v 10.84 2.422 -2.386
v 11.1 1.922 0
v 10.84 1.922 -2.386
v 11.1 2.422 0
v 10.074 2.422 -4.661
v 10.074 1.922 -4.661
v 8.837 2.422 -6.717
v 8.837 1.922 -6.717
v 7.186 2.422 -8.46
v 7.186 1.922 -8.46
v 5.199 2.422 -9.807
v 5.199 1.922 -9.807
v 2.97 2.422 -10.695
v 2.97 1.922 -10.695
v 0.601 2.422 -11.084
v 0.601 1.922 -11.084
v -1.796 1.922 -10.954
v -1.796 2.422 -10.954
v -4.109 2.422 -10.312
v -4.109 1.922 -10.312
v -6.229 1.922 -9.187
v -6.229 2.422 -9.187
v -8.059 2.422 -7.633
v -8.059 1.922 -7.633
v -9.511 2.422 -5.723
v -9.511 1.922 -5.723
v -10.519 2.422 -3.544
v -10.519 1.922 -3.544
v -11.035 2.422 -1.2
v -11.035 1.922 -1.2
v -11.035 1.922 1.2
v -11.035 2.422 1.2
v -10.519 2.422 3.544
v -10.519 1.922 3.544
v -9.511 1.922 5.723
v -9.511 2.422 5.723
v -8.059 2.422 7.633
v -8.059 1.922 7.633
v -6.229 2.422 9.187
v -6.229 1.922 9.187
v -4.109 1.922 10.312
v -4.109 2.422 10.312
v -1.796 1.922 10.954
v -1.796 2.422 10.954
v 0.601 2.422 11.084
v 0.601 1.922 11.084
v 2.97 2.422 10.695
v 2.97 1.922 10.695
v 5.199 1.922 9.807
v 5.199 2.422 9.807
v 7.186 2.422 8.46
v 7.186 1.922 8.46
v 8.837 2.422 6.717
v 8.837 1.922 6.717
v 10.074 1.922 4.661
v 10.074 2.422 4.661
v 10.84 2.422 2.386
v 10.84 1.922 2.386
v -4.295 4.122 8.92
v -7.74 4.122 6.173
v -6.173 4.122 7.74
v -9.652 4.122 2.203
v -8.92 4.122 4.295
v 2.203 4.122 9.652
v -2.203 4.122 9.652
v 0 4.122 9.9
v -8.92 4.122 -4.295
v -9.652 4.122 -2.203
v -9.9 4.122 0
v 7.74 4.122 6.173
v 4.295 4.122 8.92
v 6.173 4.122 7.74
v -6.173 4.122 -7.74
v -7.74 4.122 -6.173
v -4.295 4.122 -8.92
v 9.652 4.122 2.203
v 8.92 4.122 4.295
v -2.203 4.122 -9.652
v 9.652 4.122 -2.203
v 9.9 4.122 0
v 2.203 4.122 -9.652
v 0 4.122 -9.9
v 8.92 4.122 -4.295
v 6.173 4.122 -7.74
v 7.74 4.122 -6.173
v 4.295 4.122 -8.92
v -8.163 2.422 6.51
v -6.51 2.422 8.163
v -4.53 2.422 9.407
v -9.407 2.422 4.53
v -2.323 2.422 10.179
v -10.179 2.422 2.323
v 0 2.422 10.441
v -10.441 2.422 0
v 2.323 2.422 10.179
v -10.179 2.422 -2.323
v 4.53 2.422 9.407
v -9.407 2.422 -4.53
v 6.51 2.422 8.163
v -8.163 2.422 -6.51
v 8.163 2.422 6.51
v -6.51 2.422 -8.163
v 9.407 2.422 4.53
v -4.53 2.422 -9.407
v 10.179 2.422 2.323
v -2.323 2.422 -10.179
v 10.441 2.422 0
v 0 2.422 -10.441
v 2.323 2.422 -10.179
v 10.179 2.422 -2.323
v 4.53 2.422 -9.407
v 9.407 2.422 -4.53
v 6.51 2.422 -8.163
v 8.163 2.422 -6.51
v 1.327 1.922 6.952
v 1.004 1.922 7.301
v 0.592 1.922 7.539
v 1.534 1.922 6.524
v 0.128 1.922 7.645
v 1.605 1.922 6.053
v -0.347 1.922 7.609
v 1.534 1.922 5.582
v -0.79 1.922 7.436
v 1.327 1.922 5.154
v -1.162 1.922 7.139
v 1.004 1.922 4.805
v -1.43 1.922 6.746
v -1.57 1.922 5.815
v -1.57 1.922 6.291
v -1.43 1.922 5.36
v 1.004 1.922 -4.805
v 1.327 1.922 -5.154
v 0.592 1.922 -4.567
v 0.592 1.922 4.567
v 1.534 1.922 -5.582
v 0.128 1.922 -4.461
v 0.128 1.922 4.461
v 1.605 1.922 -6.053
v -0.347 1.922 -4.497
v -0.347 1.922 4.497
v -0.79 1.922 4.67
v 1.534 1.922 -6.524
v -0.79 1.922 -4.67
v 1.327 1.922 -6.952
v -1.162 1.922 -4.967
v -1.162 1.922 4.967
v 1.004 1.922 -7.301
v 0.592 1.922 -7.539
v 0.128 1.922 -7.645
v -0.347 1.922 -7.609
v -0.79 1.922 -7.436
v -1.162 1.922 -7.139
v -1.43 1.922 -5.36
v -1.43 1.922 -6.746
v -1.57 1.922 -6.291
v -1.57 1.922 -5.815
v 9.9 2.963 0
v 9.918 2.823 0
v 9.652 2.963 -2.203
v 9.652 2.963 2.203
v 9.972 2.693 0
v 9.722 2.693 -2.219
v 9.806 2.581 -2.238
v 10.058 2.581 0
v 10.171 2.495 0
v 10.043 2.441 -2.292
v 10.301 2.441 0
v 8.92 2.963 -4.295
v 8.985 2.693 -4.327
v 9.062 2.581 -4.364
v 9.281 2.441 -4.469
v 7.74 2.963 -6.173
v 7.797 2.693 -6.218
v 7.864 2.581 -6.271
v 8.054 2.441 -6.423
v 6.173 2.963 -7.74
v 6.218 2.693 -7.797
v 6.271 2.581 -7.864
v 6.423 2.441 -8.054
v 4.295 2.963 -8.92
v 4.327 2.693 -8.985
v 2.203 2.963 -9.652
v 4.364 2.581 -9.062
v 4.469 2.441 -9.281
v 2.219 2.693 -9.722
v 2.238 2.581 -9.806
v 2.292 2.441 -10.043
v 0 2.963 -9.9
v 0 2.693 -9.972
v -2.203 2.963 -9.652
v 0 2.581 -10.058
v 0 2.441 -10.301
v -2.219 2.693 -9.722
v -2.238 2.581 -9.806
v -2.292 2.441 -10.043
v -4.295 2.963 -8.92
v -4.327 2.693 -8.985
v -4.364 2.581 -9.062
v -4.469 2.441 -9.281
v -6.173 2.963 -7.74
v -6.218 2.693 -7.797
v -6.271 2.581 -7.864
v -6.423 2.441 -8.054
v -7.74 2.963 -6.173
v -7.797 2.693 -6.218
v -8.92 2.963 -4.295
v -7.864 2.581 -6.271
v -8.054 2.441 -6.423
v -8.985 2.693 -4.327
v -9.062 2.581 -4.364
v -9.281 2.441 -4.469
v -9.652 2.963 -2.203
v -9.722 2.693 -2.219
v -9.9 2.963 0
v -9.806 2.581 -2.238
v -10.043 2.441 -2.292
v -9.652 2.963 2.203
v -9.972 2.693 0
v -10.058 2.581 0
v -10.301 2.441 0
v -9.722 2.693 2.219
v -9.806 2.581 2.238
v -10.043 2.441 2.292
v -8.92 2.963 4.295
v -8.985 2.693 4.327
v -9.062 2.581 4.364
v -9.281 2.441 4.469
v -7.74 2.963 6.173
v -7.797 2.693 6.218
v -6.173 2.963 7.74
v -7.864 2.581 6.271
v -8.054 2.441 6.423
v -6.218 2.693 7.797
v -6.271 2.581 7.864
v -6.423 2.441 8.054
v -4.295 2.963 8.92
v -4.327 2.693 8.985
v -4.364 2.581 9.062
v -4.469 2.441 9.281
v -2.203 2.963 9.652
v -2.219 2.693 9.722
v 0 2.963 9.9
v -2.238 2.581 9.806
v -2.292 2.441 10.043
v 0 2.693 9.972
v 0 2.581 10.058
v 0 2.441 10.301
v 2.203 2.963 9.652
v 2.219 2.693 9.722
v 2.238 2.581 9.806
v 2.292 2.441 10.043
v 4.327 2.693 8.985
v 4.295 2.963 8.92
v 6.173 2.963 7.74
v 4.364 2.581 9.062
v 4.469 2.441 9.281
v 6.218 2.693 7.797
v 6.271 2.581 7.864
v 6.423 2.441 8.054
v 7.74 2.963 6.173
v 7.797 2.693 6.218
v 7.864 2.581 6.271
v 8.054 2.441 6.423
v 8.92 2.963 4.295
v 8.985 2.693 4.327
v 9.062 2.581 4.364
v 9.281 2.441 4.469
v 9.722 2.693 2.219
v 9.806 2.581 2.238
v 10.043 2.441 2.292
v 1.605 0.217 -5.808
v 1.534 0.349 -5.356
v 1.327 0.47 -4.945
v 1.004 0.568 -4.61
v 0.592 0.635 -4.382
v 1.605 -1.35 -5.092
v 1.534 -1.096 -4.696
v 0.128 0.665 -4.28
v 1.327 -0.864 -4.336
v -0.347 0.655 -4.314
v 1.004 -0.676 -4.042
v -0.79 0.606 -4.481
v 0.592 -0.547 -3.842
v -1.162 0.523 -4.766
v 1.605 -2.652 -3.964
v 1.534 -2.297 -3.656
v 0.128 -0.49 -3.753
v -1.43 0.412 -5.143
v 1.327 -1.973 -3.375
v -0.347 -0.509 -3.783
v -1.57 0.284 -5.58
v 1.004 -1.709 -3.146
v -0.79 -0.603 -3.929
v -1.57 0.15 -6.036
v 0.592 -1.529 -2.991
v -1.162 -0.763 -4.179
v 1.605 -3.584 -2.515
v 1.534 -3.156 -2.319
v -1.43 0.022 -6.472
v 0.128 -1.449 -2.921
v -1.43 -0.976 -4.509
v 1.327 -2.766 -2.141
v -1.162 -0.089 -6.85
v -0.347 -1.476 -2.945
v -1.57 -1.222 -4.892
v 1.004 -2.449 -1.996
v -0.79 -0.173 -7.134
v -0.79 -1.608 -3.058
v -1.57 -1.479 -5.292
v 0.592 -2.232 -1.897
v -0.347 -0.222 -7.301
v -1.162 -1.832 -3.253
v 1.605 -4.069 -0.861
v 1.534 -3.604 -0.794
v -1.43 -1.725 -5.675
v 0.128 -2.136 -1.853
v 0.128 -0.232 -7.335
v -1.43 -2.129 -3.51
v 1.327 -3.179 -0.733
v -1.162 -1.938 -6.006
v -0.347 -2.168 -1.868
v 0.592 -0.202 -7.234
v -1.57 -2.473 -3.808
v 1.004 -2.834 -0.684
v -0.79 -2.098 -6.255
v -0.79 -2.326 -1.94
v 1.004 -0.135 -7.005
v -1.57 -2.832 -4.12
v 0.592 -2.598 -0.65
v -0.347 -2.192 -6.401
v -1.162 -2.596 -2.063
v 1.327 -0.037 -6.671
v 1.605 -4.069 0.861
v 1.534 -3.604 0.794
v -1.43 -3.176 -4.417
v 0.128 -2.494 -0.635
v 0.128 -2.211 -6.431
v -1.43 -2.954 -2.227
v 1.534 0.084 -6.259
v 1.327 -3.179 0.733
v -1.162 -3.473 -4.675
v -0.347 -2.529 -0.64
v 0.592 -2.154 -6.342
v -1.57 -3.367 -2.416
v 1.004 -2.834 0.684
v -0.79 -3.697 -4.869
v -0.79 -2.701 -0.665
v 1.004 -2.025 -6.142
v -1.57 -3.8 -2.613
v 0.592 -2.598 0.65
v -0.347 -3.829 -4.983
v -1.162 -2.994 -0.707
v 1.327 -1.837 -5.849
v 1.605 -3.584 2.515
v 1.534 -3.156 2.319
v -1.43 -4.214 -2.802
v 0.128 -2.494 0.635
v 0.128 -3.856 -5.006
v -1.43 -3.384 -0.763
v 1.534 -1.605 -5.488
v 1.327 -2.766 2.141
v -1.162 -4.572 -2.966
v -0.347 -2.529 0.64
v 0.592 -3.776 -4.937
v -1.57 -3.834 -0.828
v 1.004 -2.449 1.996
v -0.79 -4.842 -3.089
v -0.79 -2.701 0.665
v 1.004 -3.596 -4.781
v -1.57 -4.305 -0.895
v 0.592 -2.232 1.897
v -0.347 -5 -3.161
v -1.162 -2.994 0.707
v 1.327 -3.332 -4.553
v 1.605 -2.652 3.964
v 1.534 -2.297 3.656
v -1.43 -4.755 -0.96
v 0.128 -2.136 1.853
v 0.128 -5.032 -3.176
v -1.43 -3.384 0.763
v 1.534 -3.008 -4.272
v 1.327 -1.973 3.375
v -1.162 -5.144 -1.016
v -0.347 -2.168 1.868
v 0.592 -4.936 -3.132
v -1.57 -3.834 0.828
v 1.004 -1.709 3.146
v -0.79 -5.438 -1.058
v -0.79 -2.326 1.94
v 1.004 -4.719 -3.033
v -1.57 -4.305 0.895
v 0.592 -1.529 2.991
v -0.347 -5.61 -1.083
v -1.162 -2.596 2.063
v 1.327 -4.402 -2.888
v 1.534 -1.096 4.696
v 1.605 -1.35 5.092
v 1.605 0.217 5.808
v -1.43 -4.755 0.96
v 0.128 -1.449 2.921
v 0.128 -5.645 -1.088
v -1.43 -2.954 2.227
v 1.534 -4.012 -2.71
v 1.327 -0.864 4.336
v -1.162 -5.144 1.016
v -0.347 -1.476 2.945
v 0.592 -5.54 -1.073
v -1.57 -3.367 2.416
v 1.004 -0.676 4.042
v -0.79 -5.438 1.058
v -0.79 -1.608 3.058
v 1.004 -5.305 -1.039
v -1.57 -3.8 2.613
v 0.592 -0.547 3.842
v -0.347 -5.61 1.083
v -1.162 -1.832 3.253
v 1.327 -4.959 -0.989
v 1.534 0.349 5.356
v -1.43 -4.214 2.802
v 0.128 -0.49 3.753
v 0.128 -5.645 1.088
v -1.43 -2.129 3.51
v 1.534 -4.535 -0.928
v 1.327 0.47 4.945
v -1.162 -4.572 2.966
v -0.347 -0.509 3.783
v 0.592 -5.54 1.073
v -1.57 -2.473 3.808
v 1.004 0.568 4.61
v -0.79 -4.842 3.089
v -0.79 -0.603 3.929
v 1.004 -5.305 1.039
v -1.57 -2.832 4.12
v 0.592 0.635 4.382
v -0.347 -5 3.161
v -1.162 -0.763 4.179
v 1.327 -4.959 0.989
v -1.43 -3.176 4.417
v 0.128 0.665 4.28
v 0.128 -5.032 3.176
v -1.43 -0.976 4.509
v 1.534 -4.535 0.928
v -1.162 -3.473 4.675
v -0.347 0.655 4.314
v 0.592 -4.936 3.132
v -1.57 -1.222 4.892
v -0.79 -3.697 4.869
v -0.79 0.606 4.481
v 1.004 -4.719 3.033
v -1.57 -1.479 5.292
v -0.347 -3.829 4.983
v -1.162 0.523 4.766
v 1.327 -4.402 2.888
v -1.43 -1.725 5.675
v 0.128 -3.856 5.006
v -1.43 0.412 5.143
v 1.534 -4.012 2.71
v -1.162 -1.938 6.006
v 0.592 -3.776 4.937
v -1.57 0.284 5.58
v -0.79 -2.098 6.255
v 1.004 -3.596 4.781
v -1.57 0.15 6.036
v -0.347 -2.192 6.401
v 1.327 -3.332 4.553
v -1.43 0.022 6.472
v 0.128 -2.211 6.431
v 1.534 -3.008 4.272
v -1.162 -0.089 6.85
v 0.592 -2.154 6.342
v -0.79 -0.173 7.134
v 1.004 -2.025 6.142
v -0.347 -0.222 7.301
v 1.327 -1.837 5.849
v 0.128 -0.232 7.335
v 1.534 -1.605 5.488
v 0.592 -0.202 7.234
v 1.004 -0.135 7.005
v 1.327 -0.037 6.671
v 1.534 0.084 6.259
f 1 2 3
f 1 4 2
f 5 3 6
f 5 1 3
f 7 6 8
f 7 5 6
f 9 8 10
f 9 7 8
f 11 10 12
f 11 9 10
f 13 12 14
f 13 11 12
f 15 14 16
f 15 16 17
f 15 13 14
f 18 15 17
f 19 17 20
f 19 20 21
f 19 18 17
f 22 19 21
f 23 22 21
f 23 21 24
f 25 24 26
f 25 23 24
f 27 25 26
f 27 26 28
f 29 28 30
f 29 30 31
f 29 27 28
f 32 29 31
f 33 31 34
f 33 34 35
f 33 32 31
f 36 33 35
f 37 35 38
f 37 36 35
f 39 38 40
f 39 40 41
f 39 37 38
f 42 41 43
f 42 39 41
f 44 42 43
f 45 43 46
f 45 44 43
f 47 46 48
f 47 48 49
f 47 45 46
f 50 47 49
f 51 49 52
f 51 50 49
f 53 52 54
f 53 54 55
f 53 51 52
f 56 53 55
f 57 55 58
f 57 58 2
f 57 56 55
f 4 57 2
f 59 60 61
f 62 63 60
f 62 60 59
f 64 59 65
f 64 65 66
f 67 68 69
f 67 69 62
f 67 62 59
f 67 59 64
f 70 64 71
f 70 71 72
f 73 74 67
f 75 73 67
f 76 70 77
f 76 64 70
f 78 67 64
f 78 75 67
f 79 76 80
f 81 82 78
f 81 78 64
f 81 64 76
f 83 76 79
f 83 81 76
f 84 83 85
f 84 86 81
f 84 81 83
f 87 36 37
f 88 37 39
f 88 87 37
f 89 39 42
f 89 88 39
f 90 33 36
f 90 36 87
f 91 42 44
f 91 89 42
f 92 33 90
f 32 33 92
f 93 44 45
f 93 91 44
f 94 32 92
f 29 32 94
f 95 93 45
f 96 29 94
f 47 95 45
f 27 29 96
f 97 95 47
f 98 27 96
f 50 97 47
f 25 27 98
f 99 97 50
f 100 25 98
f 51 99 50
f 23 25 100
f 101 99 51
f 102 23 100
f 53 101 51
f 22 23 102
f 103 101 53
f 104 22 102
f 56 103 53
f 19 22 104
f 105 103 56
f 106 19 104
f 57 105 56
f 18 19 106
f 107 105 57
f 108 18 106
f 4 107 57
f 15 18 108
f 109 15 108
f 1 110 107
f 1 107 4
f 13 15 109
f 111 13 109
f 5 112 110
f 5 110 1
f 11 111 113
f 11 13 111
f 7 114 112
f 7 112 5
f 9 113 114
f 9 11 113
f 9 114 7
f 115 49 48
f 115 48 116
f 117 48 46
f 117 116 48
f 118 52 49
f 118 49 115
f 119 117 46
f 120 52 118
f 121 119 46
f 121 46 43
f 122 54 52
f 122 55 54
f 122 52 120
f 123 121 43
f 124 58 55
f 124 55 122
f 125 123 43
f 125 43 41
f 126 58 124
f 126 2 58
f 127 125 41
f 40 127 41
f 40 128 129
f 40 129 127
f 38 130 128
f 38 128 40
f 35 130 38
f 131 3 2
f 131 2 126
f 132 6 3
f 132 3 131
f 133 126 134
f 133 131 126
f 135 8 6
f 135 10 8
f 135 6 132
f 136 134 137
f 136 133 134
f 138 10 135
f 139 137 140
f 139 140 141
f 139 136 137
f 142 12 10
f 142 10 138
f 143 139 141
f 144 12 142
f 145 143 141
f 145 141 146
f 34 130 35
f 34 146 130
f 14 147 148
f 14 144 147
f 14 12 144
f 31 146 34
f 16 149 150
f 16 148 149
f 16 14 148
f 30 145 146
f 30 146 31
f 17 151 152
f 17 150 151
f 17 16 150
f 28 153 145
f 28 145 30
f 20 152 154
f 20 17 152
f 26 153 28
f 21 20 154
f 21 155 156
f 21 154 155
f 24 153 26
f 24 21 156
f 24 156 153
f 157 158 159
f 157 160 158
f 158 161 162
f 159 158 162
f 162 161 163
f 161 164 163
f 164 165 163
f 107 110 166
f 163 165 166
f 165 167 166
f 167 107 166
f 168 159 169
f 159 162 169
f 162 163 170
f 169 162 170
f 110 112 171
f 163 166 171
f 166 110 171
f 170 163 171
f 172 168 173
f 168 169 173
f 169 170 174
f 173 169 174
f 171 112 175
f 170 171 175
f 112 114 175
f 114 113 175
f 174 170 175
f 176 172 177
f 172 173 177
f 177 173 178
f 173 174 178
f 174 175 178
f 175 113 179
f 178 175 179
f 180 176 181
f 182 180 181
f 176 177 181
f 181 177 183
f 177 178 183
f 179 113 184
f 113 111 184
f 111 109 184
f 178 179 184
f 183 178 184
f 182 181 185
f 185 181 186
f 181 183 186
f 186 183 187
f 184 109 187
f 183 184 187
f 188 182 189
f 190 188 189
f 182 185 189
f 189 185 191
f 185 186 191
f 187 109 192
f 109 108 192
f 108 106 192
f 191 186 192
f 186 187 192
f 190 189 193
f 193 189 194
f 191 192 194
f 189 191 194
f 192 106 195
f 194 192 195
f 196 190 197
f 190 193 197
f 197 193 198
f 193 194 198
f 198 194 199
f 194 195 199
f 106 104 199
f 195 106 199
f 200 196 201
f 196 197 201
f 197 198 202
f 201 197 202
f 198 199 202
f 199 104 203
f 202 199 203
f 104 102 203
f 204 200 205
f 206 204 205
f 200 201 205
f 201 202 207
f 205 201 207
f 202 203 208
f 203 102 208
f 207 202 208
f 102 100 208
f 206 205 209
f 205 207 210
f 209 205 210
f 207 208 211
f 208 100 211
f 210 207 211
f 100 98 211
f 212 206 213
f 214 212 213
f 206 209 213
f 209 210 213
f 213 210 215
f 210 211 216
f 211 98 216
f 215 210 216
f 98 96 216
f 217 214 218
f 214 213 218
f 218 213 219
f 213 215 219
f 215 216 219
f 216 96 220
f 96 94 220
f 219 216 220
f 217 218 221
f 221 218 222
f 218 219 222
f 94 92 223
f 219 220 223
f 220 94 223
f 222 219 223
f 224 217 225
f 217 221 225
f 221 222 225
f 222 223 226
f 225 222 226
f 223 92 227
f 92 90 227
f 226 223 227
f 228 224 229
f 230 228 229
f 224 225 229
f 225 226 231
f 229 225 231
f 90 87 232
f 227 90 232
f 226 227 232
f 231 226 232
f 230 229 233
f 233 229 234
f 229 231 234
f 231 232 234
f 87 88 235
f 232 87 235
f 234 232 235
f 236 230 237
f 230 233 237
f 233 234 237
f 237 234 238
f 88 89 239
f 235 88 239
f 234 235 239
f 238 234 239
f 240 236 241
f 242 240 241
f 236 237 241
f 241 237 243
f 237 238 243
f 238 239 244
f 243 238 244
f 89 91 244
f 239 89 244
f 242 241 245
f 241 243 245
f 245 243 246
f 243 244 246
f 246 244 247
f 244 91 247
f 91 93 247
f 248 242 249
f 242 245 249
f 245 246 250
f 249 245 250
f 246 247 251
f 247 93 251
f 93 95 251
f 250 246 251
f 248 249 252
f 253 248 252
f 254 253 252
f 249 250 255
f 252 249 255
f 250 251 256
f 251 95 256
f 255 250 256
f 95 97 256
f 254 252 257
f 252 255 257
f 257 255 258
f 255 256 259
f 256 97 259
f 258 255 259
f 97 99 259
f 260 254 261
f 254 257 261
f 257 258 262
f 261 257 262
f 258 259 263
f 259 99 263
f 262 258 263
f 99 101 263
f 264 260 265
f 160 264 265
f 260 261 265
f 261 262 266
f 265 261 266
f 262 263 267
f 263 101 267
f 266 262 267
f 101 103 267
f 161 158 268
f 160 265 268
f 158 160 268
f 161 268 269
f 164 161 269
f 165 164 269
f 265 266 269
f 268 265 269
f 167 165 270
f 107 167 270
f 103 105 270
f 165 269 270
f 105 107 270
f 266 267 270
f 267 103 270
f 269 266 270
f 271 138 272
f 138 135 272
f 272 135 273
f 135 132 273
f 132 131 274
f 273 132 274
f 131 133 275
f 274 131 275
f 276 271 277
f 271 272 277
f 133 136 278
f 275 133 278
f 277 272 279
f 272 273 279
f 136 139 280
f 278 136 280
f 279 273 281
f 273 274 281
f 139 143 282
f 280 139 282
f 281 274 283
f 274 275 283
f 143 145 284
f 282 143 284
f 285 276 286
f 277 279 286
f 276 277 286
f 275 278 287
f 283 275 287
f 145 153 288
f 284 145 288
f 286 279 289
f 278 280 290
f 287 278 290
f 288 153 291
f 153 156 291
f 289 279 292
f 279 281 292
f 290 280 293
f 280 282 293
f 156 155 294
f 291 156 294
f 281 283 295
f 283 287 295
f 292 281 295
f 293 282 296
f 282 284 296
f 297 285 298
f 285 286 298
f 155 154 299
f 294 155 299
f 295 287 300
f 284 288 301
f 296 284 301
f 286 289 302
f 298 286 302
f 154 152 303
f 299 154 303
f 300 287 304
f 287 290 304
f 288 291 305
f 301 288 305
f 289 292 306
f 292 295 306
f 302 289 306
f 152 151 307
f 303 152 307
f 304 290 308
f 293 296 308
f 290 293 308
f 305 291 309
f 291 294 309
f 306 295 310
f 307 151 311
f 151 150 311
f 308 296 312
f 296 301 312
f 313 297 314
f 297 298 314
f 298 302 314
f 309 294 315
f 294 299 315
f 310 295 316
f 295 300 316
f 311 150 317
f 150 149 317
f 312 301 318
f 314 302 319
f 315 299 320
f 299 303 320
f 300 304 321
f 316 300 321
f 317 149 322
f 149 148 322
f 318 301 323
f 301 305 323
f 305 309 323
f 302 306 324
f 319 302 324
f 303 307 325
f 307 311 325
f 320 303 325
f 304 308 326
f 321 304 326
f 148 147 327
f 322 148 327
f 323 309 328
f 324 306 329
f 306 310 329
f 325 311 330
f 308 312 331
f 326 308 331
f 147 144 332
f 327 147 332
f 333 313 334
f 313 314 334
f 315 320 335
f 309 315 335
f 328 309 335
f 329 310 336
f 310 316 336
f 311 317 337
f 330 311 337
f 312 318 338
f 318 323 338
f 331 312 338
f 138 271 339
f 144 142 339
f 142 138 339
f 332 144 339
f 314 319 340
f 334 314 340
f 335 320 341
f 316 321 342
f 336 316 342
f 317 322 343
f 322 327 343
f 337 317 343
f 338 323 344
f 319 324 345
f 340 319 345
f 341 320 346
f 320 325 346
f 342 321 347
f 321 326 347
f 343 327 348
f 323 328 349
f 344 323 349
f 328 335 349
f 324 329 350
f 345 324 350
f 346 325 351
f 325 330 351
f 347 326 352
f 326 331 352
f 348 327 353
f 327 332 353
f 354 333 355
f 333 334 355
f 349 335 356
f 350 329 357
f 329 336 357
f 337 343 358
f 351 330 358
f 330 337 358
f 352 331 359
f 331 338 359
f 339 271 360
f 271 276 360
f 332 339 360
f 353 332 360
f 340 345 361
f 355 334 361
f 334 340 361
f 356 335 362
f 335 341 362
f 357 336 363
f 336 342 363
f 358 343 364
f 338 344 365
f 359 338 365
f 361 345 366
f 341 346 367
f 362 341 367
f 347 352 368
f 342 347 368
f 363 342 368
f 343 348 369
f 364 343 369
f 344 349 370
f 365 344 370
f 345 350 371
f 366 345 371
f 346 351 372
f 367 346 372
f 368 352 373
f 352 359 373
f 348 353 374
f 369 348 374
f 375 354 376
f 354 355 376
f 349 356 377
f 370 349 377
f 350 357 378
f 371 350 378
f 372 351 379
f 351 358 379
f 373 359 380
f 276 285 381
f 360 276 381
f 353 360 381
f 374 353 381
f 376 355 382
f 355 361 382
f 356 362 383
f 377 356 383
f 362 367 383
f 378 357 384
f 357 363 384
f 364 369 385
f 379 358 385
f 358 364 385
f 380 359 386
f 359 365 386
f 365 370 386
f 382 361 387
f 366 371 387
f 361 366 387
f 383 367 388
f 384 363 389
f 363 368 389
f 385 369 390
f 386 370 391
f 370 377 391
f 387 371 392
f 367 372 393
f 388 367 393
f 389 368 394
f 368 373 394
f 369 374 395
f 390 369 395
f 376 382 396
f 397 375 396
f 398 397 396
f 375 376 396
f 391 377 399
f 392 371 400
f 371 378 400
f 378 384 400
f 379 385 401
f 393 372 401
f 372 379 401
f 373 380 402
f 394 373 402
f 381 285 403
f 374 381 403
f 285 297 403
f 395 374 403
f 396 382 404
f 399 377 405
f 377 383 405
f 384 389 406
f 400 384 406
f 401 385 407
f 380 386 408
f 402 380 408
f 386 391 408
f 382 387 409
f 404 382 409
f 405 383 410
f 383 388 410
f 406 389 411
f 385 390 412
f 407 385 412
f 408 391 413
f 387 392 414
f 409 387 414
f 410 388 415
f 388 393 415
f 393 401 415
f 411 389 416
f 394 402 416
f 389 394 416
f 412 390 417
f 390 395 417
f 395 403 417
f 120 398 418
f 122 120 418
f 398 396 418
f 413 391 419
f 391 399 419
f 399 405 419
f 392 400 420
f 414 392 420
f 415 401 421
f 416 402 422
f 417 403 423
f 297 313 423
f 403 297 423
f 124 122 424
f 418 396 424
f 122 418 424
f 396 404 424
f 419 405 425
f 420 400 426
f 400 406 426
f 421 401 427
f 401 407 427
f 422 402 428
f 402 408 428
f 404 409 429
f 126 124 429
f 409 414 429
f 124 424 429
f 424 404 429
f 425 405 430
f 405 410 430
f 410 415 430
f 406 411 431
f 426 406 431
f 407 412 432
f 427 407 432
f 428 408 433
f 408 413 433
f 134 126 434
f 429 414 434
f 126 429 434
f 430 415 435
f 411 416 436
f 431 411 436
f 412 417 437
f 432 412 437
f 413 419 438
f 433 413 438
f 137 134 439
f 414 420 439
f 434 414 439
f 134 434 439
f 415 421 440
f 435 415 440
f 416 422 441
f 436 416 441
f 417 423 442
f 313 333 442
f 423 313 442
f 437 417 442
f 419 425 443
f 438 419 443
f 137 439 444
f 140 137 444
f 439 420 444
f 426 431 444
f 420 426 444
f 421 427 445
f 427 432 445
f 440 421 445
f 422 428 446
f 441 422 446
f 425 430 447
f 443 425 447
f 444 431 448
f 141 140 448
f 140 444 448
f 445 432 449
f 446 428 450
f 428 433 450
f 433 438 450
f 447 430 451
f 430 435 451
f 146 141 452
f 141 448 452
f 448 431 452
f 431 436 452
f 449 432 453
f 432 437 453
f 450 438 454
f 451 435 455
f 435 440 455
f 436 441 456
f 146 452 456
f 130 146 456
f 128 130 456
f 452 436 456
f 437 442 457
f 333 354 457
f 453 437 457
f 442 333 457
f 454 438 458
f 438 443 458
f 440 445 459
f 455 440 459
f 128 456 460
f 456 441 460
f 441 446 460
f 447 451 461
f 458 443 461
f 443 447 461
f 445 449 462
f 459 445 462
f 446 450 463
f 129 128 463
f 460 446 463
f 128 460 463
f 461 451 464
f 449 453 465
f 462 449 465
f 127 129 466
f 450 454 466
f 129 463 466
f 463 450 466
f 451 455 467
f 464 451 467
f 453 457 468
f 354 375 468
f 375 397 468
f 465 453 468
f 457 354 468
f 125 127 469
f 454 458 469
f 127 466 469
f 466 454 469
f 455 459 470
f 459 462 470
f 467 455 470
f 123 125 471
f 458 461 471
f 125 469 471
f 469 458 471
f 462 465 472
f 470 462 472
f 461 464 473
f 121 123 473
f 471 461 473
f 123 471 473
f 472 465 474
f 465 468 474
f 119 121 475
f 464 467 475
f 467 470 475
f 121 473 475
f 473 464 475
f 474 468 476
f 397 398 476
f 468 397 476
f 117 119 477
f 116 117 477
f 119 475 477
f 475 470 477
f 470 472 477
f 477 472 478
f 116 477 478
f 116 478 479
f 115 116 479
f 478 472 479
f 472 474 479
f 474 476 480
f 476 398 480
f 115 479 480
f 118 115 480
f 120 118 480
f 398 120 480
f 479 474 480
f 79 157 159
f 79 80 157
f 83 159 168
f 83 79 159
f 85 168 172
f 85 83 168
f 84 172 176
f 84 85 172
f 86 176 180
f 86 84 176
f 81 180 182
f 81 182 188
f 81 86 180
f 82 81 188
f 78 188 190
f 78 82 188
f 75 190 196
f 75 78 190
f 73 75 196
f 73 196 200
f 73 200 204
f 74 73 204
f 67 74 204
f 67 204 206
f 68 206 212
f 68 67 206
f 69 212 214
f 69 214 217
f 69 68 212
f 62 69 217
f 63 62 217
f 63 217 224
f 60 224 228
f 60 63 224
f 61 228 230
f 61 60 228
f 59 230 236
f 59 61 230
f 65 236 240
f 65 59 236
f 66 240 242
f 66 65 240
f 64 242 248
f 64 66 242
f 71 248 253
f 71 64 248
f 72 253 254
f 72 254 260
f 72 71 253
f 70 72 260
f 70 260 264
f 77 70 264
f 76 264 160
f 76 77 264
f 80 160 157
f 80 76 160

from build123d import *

# Parameters (mm, degrees)
SKETCH001_R         = 1.596485
REVOLUTION001_ANGLE = -180


with BuildPart() as part:
    # Sketch → Revolution (revolve)
    with BuildSketch(Plane.XY):
        with BuildLine():
            Line((0, 1.922073), (11.1, 1.922073))
            Line((11.1, 1.922073), (11.1, 2.422073))
            Line((11.1, 2.422073), (10.441024, 2.422073))
            ThreePointArc((9.9, 2.963097), (10.058462, 2.580535), (10.441024, 2.422073))
            Line((9.9, 2.963097), (9.9, 4.122073))
            Line((9.9, 4.122073), (0, 4.122073))
            Line((0, 4.122073), (0, 1.922073))
        make_face()
    revolve(axis=Axis((0, 0, 0), (0, 1, 0)))

    # Sketch001 (on Face3 of Revolution) → Revolution001 (revolve)
    with BuildSketch(Plane.XZ.offset(-1.922073)):
        with Locations((0.008299, -6.053004)):
            Circle(SKETCH001_R)
    revolve(axis=Axis((0, 1.922073, 0), (1, 0, 0)), revolution_arc=REVOLUTION001_ANGLE)


solid = part.part
